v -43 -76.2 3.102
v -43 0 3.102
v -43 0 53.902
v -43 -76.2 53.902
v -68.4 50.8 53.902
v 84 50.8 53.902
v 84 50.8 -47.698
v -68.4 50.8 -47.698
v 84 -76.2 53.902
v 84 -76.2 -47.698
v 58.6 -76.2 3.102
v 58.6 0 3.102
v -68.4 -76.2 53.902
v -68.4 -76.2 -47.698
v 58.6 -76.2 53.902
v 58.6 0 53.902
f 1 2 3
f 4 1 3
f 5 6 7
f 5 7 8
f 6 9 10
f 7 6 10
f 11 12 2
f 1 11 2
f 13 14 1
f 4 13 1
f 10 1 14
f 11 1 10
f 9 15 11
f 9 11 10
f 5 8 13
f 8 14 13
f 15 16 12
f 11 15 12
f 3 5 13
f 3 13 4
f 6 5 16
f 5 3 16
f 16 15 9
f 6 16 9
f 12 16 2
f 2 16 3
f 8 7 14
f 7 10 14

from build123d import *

# Parameters (mm, degrees)
F1_DEPTH = 76.2
F2_W     = 101.6
F2_H     = 50.8
F3_DEPTH = 50.8


with BuildPart() as f1:
    # F0 (on Front) → F1 (new body)
    with BuildSketch(Plane.XZ):
        Polygon((-68.4001594782, 53.9017294705), (-68.4001594782, -47.6982705295), (83.9998405218, -47.6982705295), (83.9998405218, 53.9017294705), (58.5998405218, 53.9017294705), (58.5998405218, 3.1017294705), (-43.0001594782, 3.1017294705), (-43.0001594782, 53.9017294705), align=None)
    extrude(amount=F1_DEPTH)

    # F2 (on face) → F3 (join)
    with BuildSketch(Plane(origin=(0, 0, 0), x_dir=(-1, 0, 0), z_dir=(0, 1, 0))):
        with Locations((-7.7998405218, 28.5017294705)):
            Rectangle(F2_W, F2_H)
        Polygon((-58.5998405218, 53.9017294705), (-83.9998405218, 53.9017294705), (-83.9998405218, -47.6982705295), (68.4001594782, -47.6982705295), (68.4001594782, 53.9017294705), (43.0001594782, 53.9017294705), (43.0001594782, 3.1017294705), (-58.5998405218, 3.1017294705), align=None)
    extrude(amount=F3_DEPTH)


solid = f1.part
